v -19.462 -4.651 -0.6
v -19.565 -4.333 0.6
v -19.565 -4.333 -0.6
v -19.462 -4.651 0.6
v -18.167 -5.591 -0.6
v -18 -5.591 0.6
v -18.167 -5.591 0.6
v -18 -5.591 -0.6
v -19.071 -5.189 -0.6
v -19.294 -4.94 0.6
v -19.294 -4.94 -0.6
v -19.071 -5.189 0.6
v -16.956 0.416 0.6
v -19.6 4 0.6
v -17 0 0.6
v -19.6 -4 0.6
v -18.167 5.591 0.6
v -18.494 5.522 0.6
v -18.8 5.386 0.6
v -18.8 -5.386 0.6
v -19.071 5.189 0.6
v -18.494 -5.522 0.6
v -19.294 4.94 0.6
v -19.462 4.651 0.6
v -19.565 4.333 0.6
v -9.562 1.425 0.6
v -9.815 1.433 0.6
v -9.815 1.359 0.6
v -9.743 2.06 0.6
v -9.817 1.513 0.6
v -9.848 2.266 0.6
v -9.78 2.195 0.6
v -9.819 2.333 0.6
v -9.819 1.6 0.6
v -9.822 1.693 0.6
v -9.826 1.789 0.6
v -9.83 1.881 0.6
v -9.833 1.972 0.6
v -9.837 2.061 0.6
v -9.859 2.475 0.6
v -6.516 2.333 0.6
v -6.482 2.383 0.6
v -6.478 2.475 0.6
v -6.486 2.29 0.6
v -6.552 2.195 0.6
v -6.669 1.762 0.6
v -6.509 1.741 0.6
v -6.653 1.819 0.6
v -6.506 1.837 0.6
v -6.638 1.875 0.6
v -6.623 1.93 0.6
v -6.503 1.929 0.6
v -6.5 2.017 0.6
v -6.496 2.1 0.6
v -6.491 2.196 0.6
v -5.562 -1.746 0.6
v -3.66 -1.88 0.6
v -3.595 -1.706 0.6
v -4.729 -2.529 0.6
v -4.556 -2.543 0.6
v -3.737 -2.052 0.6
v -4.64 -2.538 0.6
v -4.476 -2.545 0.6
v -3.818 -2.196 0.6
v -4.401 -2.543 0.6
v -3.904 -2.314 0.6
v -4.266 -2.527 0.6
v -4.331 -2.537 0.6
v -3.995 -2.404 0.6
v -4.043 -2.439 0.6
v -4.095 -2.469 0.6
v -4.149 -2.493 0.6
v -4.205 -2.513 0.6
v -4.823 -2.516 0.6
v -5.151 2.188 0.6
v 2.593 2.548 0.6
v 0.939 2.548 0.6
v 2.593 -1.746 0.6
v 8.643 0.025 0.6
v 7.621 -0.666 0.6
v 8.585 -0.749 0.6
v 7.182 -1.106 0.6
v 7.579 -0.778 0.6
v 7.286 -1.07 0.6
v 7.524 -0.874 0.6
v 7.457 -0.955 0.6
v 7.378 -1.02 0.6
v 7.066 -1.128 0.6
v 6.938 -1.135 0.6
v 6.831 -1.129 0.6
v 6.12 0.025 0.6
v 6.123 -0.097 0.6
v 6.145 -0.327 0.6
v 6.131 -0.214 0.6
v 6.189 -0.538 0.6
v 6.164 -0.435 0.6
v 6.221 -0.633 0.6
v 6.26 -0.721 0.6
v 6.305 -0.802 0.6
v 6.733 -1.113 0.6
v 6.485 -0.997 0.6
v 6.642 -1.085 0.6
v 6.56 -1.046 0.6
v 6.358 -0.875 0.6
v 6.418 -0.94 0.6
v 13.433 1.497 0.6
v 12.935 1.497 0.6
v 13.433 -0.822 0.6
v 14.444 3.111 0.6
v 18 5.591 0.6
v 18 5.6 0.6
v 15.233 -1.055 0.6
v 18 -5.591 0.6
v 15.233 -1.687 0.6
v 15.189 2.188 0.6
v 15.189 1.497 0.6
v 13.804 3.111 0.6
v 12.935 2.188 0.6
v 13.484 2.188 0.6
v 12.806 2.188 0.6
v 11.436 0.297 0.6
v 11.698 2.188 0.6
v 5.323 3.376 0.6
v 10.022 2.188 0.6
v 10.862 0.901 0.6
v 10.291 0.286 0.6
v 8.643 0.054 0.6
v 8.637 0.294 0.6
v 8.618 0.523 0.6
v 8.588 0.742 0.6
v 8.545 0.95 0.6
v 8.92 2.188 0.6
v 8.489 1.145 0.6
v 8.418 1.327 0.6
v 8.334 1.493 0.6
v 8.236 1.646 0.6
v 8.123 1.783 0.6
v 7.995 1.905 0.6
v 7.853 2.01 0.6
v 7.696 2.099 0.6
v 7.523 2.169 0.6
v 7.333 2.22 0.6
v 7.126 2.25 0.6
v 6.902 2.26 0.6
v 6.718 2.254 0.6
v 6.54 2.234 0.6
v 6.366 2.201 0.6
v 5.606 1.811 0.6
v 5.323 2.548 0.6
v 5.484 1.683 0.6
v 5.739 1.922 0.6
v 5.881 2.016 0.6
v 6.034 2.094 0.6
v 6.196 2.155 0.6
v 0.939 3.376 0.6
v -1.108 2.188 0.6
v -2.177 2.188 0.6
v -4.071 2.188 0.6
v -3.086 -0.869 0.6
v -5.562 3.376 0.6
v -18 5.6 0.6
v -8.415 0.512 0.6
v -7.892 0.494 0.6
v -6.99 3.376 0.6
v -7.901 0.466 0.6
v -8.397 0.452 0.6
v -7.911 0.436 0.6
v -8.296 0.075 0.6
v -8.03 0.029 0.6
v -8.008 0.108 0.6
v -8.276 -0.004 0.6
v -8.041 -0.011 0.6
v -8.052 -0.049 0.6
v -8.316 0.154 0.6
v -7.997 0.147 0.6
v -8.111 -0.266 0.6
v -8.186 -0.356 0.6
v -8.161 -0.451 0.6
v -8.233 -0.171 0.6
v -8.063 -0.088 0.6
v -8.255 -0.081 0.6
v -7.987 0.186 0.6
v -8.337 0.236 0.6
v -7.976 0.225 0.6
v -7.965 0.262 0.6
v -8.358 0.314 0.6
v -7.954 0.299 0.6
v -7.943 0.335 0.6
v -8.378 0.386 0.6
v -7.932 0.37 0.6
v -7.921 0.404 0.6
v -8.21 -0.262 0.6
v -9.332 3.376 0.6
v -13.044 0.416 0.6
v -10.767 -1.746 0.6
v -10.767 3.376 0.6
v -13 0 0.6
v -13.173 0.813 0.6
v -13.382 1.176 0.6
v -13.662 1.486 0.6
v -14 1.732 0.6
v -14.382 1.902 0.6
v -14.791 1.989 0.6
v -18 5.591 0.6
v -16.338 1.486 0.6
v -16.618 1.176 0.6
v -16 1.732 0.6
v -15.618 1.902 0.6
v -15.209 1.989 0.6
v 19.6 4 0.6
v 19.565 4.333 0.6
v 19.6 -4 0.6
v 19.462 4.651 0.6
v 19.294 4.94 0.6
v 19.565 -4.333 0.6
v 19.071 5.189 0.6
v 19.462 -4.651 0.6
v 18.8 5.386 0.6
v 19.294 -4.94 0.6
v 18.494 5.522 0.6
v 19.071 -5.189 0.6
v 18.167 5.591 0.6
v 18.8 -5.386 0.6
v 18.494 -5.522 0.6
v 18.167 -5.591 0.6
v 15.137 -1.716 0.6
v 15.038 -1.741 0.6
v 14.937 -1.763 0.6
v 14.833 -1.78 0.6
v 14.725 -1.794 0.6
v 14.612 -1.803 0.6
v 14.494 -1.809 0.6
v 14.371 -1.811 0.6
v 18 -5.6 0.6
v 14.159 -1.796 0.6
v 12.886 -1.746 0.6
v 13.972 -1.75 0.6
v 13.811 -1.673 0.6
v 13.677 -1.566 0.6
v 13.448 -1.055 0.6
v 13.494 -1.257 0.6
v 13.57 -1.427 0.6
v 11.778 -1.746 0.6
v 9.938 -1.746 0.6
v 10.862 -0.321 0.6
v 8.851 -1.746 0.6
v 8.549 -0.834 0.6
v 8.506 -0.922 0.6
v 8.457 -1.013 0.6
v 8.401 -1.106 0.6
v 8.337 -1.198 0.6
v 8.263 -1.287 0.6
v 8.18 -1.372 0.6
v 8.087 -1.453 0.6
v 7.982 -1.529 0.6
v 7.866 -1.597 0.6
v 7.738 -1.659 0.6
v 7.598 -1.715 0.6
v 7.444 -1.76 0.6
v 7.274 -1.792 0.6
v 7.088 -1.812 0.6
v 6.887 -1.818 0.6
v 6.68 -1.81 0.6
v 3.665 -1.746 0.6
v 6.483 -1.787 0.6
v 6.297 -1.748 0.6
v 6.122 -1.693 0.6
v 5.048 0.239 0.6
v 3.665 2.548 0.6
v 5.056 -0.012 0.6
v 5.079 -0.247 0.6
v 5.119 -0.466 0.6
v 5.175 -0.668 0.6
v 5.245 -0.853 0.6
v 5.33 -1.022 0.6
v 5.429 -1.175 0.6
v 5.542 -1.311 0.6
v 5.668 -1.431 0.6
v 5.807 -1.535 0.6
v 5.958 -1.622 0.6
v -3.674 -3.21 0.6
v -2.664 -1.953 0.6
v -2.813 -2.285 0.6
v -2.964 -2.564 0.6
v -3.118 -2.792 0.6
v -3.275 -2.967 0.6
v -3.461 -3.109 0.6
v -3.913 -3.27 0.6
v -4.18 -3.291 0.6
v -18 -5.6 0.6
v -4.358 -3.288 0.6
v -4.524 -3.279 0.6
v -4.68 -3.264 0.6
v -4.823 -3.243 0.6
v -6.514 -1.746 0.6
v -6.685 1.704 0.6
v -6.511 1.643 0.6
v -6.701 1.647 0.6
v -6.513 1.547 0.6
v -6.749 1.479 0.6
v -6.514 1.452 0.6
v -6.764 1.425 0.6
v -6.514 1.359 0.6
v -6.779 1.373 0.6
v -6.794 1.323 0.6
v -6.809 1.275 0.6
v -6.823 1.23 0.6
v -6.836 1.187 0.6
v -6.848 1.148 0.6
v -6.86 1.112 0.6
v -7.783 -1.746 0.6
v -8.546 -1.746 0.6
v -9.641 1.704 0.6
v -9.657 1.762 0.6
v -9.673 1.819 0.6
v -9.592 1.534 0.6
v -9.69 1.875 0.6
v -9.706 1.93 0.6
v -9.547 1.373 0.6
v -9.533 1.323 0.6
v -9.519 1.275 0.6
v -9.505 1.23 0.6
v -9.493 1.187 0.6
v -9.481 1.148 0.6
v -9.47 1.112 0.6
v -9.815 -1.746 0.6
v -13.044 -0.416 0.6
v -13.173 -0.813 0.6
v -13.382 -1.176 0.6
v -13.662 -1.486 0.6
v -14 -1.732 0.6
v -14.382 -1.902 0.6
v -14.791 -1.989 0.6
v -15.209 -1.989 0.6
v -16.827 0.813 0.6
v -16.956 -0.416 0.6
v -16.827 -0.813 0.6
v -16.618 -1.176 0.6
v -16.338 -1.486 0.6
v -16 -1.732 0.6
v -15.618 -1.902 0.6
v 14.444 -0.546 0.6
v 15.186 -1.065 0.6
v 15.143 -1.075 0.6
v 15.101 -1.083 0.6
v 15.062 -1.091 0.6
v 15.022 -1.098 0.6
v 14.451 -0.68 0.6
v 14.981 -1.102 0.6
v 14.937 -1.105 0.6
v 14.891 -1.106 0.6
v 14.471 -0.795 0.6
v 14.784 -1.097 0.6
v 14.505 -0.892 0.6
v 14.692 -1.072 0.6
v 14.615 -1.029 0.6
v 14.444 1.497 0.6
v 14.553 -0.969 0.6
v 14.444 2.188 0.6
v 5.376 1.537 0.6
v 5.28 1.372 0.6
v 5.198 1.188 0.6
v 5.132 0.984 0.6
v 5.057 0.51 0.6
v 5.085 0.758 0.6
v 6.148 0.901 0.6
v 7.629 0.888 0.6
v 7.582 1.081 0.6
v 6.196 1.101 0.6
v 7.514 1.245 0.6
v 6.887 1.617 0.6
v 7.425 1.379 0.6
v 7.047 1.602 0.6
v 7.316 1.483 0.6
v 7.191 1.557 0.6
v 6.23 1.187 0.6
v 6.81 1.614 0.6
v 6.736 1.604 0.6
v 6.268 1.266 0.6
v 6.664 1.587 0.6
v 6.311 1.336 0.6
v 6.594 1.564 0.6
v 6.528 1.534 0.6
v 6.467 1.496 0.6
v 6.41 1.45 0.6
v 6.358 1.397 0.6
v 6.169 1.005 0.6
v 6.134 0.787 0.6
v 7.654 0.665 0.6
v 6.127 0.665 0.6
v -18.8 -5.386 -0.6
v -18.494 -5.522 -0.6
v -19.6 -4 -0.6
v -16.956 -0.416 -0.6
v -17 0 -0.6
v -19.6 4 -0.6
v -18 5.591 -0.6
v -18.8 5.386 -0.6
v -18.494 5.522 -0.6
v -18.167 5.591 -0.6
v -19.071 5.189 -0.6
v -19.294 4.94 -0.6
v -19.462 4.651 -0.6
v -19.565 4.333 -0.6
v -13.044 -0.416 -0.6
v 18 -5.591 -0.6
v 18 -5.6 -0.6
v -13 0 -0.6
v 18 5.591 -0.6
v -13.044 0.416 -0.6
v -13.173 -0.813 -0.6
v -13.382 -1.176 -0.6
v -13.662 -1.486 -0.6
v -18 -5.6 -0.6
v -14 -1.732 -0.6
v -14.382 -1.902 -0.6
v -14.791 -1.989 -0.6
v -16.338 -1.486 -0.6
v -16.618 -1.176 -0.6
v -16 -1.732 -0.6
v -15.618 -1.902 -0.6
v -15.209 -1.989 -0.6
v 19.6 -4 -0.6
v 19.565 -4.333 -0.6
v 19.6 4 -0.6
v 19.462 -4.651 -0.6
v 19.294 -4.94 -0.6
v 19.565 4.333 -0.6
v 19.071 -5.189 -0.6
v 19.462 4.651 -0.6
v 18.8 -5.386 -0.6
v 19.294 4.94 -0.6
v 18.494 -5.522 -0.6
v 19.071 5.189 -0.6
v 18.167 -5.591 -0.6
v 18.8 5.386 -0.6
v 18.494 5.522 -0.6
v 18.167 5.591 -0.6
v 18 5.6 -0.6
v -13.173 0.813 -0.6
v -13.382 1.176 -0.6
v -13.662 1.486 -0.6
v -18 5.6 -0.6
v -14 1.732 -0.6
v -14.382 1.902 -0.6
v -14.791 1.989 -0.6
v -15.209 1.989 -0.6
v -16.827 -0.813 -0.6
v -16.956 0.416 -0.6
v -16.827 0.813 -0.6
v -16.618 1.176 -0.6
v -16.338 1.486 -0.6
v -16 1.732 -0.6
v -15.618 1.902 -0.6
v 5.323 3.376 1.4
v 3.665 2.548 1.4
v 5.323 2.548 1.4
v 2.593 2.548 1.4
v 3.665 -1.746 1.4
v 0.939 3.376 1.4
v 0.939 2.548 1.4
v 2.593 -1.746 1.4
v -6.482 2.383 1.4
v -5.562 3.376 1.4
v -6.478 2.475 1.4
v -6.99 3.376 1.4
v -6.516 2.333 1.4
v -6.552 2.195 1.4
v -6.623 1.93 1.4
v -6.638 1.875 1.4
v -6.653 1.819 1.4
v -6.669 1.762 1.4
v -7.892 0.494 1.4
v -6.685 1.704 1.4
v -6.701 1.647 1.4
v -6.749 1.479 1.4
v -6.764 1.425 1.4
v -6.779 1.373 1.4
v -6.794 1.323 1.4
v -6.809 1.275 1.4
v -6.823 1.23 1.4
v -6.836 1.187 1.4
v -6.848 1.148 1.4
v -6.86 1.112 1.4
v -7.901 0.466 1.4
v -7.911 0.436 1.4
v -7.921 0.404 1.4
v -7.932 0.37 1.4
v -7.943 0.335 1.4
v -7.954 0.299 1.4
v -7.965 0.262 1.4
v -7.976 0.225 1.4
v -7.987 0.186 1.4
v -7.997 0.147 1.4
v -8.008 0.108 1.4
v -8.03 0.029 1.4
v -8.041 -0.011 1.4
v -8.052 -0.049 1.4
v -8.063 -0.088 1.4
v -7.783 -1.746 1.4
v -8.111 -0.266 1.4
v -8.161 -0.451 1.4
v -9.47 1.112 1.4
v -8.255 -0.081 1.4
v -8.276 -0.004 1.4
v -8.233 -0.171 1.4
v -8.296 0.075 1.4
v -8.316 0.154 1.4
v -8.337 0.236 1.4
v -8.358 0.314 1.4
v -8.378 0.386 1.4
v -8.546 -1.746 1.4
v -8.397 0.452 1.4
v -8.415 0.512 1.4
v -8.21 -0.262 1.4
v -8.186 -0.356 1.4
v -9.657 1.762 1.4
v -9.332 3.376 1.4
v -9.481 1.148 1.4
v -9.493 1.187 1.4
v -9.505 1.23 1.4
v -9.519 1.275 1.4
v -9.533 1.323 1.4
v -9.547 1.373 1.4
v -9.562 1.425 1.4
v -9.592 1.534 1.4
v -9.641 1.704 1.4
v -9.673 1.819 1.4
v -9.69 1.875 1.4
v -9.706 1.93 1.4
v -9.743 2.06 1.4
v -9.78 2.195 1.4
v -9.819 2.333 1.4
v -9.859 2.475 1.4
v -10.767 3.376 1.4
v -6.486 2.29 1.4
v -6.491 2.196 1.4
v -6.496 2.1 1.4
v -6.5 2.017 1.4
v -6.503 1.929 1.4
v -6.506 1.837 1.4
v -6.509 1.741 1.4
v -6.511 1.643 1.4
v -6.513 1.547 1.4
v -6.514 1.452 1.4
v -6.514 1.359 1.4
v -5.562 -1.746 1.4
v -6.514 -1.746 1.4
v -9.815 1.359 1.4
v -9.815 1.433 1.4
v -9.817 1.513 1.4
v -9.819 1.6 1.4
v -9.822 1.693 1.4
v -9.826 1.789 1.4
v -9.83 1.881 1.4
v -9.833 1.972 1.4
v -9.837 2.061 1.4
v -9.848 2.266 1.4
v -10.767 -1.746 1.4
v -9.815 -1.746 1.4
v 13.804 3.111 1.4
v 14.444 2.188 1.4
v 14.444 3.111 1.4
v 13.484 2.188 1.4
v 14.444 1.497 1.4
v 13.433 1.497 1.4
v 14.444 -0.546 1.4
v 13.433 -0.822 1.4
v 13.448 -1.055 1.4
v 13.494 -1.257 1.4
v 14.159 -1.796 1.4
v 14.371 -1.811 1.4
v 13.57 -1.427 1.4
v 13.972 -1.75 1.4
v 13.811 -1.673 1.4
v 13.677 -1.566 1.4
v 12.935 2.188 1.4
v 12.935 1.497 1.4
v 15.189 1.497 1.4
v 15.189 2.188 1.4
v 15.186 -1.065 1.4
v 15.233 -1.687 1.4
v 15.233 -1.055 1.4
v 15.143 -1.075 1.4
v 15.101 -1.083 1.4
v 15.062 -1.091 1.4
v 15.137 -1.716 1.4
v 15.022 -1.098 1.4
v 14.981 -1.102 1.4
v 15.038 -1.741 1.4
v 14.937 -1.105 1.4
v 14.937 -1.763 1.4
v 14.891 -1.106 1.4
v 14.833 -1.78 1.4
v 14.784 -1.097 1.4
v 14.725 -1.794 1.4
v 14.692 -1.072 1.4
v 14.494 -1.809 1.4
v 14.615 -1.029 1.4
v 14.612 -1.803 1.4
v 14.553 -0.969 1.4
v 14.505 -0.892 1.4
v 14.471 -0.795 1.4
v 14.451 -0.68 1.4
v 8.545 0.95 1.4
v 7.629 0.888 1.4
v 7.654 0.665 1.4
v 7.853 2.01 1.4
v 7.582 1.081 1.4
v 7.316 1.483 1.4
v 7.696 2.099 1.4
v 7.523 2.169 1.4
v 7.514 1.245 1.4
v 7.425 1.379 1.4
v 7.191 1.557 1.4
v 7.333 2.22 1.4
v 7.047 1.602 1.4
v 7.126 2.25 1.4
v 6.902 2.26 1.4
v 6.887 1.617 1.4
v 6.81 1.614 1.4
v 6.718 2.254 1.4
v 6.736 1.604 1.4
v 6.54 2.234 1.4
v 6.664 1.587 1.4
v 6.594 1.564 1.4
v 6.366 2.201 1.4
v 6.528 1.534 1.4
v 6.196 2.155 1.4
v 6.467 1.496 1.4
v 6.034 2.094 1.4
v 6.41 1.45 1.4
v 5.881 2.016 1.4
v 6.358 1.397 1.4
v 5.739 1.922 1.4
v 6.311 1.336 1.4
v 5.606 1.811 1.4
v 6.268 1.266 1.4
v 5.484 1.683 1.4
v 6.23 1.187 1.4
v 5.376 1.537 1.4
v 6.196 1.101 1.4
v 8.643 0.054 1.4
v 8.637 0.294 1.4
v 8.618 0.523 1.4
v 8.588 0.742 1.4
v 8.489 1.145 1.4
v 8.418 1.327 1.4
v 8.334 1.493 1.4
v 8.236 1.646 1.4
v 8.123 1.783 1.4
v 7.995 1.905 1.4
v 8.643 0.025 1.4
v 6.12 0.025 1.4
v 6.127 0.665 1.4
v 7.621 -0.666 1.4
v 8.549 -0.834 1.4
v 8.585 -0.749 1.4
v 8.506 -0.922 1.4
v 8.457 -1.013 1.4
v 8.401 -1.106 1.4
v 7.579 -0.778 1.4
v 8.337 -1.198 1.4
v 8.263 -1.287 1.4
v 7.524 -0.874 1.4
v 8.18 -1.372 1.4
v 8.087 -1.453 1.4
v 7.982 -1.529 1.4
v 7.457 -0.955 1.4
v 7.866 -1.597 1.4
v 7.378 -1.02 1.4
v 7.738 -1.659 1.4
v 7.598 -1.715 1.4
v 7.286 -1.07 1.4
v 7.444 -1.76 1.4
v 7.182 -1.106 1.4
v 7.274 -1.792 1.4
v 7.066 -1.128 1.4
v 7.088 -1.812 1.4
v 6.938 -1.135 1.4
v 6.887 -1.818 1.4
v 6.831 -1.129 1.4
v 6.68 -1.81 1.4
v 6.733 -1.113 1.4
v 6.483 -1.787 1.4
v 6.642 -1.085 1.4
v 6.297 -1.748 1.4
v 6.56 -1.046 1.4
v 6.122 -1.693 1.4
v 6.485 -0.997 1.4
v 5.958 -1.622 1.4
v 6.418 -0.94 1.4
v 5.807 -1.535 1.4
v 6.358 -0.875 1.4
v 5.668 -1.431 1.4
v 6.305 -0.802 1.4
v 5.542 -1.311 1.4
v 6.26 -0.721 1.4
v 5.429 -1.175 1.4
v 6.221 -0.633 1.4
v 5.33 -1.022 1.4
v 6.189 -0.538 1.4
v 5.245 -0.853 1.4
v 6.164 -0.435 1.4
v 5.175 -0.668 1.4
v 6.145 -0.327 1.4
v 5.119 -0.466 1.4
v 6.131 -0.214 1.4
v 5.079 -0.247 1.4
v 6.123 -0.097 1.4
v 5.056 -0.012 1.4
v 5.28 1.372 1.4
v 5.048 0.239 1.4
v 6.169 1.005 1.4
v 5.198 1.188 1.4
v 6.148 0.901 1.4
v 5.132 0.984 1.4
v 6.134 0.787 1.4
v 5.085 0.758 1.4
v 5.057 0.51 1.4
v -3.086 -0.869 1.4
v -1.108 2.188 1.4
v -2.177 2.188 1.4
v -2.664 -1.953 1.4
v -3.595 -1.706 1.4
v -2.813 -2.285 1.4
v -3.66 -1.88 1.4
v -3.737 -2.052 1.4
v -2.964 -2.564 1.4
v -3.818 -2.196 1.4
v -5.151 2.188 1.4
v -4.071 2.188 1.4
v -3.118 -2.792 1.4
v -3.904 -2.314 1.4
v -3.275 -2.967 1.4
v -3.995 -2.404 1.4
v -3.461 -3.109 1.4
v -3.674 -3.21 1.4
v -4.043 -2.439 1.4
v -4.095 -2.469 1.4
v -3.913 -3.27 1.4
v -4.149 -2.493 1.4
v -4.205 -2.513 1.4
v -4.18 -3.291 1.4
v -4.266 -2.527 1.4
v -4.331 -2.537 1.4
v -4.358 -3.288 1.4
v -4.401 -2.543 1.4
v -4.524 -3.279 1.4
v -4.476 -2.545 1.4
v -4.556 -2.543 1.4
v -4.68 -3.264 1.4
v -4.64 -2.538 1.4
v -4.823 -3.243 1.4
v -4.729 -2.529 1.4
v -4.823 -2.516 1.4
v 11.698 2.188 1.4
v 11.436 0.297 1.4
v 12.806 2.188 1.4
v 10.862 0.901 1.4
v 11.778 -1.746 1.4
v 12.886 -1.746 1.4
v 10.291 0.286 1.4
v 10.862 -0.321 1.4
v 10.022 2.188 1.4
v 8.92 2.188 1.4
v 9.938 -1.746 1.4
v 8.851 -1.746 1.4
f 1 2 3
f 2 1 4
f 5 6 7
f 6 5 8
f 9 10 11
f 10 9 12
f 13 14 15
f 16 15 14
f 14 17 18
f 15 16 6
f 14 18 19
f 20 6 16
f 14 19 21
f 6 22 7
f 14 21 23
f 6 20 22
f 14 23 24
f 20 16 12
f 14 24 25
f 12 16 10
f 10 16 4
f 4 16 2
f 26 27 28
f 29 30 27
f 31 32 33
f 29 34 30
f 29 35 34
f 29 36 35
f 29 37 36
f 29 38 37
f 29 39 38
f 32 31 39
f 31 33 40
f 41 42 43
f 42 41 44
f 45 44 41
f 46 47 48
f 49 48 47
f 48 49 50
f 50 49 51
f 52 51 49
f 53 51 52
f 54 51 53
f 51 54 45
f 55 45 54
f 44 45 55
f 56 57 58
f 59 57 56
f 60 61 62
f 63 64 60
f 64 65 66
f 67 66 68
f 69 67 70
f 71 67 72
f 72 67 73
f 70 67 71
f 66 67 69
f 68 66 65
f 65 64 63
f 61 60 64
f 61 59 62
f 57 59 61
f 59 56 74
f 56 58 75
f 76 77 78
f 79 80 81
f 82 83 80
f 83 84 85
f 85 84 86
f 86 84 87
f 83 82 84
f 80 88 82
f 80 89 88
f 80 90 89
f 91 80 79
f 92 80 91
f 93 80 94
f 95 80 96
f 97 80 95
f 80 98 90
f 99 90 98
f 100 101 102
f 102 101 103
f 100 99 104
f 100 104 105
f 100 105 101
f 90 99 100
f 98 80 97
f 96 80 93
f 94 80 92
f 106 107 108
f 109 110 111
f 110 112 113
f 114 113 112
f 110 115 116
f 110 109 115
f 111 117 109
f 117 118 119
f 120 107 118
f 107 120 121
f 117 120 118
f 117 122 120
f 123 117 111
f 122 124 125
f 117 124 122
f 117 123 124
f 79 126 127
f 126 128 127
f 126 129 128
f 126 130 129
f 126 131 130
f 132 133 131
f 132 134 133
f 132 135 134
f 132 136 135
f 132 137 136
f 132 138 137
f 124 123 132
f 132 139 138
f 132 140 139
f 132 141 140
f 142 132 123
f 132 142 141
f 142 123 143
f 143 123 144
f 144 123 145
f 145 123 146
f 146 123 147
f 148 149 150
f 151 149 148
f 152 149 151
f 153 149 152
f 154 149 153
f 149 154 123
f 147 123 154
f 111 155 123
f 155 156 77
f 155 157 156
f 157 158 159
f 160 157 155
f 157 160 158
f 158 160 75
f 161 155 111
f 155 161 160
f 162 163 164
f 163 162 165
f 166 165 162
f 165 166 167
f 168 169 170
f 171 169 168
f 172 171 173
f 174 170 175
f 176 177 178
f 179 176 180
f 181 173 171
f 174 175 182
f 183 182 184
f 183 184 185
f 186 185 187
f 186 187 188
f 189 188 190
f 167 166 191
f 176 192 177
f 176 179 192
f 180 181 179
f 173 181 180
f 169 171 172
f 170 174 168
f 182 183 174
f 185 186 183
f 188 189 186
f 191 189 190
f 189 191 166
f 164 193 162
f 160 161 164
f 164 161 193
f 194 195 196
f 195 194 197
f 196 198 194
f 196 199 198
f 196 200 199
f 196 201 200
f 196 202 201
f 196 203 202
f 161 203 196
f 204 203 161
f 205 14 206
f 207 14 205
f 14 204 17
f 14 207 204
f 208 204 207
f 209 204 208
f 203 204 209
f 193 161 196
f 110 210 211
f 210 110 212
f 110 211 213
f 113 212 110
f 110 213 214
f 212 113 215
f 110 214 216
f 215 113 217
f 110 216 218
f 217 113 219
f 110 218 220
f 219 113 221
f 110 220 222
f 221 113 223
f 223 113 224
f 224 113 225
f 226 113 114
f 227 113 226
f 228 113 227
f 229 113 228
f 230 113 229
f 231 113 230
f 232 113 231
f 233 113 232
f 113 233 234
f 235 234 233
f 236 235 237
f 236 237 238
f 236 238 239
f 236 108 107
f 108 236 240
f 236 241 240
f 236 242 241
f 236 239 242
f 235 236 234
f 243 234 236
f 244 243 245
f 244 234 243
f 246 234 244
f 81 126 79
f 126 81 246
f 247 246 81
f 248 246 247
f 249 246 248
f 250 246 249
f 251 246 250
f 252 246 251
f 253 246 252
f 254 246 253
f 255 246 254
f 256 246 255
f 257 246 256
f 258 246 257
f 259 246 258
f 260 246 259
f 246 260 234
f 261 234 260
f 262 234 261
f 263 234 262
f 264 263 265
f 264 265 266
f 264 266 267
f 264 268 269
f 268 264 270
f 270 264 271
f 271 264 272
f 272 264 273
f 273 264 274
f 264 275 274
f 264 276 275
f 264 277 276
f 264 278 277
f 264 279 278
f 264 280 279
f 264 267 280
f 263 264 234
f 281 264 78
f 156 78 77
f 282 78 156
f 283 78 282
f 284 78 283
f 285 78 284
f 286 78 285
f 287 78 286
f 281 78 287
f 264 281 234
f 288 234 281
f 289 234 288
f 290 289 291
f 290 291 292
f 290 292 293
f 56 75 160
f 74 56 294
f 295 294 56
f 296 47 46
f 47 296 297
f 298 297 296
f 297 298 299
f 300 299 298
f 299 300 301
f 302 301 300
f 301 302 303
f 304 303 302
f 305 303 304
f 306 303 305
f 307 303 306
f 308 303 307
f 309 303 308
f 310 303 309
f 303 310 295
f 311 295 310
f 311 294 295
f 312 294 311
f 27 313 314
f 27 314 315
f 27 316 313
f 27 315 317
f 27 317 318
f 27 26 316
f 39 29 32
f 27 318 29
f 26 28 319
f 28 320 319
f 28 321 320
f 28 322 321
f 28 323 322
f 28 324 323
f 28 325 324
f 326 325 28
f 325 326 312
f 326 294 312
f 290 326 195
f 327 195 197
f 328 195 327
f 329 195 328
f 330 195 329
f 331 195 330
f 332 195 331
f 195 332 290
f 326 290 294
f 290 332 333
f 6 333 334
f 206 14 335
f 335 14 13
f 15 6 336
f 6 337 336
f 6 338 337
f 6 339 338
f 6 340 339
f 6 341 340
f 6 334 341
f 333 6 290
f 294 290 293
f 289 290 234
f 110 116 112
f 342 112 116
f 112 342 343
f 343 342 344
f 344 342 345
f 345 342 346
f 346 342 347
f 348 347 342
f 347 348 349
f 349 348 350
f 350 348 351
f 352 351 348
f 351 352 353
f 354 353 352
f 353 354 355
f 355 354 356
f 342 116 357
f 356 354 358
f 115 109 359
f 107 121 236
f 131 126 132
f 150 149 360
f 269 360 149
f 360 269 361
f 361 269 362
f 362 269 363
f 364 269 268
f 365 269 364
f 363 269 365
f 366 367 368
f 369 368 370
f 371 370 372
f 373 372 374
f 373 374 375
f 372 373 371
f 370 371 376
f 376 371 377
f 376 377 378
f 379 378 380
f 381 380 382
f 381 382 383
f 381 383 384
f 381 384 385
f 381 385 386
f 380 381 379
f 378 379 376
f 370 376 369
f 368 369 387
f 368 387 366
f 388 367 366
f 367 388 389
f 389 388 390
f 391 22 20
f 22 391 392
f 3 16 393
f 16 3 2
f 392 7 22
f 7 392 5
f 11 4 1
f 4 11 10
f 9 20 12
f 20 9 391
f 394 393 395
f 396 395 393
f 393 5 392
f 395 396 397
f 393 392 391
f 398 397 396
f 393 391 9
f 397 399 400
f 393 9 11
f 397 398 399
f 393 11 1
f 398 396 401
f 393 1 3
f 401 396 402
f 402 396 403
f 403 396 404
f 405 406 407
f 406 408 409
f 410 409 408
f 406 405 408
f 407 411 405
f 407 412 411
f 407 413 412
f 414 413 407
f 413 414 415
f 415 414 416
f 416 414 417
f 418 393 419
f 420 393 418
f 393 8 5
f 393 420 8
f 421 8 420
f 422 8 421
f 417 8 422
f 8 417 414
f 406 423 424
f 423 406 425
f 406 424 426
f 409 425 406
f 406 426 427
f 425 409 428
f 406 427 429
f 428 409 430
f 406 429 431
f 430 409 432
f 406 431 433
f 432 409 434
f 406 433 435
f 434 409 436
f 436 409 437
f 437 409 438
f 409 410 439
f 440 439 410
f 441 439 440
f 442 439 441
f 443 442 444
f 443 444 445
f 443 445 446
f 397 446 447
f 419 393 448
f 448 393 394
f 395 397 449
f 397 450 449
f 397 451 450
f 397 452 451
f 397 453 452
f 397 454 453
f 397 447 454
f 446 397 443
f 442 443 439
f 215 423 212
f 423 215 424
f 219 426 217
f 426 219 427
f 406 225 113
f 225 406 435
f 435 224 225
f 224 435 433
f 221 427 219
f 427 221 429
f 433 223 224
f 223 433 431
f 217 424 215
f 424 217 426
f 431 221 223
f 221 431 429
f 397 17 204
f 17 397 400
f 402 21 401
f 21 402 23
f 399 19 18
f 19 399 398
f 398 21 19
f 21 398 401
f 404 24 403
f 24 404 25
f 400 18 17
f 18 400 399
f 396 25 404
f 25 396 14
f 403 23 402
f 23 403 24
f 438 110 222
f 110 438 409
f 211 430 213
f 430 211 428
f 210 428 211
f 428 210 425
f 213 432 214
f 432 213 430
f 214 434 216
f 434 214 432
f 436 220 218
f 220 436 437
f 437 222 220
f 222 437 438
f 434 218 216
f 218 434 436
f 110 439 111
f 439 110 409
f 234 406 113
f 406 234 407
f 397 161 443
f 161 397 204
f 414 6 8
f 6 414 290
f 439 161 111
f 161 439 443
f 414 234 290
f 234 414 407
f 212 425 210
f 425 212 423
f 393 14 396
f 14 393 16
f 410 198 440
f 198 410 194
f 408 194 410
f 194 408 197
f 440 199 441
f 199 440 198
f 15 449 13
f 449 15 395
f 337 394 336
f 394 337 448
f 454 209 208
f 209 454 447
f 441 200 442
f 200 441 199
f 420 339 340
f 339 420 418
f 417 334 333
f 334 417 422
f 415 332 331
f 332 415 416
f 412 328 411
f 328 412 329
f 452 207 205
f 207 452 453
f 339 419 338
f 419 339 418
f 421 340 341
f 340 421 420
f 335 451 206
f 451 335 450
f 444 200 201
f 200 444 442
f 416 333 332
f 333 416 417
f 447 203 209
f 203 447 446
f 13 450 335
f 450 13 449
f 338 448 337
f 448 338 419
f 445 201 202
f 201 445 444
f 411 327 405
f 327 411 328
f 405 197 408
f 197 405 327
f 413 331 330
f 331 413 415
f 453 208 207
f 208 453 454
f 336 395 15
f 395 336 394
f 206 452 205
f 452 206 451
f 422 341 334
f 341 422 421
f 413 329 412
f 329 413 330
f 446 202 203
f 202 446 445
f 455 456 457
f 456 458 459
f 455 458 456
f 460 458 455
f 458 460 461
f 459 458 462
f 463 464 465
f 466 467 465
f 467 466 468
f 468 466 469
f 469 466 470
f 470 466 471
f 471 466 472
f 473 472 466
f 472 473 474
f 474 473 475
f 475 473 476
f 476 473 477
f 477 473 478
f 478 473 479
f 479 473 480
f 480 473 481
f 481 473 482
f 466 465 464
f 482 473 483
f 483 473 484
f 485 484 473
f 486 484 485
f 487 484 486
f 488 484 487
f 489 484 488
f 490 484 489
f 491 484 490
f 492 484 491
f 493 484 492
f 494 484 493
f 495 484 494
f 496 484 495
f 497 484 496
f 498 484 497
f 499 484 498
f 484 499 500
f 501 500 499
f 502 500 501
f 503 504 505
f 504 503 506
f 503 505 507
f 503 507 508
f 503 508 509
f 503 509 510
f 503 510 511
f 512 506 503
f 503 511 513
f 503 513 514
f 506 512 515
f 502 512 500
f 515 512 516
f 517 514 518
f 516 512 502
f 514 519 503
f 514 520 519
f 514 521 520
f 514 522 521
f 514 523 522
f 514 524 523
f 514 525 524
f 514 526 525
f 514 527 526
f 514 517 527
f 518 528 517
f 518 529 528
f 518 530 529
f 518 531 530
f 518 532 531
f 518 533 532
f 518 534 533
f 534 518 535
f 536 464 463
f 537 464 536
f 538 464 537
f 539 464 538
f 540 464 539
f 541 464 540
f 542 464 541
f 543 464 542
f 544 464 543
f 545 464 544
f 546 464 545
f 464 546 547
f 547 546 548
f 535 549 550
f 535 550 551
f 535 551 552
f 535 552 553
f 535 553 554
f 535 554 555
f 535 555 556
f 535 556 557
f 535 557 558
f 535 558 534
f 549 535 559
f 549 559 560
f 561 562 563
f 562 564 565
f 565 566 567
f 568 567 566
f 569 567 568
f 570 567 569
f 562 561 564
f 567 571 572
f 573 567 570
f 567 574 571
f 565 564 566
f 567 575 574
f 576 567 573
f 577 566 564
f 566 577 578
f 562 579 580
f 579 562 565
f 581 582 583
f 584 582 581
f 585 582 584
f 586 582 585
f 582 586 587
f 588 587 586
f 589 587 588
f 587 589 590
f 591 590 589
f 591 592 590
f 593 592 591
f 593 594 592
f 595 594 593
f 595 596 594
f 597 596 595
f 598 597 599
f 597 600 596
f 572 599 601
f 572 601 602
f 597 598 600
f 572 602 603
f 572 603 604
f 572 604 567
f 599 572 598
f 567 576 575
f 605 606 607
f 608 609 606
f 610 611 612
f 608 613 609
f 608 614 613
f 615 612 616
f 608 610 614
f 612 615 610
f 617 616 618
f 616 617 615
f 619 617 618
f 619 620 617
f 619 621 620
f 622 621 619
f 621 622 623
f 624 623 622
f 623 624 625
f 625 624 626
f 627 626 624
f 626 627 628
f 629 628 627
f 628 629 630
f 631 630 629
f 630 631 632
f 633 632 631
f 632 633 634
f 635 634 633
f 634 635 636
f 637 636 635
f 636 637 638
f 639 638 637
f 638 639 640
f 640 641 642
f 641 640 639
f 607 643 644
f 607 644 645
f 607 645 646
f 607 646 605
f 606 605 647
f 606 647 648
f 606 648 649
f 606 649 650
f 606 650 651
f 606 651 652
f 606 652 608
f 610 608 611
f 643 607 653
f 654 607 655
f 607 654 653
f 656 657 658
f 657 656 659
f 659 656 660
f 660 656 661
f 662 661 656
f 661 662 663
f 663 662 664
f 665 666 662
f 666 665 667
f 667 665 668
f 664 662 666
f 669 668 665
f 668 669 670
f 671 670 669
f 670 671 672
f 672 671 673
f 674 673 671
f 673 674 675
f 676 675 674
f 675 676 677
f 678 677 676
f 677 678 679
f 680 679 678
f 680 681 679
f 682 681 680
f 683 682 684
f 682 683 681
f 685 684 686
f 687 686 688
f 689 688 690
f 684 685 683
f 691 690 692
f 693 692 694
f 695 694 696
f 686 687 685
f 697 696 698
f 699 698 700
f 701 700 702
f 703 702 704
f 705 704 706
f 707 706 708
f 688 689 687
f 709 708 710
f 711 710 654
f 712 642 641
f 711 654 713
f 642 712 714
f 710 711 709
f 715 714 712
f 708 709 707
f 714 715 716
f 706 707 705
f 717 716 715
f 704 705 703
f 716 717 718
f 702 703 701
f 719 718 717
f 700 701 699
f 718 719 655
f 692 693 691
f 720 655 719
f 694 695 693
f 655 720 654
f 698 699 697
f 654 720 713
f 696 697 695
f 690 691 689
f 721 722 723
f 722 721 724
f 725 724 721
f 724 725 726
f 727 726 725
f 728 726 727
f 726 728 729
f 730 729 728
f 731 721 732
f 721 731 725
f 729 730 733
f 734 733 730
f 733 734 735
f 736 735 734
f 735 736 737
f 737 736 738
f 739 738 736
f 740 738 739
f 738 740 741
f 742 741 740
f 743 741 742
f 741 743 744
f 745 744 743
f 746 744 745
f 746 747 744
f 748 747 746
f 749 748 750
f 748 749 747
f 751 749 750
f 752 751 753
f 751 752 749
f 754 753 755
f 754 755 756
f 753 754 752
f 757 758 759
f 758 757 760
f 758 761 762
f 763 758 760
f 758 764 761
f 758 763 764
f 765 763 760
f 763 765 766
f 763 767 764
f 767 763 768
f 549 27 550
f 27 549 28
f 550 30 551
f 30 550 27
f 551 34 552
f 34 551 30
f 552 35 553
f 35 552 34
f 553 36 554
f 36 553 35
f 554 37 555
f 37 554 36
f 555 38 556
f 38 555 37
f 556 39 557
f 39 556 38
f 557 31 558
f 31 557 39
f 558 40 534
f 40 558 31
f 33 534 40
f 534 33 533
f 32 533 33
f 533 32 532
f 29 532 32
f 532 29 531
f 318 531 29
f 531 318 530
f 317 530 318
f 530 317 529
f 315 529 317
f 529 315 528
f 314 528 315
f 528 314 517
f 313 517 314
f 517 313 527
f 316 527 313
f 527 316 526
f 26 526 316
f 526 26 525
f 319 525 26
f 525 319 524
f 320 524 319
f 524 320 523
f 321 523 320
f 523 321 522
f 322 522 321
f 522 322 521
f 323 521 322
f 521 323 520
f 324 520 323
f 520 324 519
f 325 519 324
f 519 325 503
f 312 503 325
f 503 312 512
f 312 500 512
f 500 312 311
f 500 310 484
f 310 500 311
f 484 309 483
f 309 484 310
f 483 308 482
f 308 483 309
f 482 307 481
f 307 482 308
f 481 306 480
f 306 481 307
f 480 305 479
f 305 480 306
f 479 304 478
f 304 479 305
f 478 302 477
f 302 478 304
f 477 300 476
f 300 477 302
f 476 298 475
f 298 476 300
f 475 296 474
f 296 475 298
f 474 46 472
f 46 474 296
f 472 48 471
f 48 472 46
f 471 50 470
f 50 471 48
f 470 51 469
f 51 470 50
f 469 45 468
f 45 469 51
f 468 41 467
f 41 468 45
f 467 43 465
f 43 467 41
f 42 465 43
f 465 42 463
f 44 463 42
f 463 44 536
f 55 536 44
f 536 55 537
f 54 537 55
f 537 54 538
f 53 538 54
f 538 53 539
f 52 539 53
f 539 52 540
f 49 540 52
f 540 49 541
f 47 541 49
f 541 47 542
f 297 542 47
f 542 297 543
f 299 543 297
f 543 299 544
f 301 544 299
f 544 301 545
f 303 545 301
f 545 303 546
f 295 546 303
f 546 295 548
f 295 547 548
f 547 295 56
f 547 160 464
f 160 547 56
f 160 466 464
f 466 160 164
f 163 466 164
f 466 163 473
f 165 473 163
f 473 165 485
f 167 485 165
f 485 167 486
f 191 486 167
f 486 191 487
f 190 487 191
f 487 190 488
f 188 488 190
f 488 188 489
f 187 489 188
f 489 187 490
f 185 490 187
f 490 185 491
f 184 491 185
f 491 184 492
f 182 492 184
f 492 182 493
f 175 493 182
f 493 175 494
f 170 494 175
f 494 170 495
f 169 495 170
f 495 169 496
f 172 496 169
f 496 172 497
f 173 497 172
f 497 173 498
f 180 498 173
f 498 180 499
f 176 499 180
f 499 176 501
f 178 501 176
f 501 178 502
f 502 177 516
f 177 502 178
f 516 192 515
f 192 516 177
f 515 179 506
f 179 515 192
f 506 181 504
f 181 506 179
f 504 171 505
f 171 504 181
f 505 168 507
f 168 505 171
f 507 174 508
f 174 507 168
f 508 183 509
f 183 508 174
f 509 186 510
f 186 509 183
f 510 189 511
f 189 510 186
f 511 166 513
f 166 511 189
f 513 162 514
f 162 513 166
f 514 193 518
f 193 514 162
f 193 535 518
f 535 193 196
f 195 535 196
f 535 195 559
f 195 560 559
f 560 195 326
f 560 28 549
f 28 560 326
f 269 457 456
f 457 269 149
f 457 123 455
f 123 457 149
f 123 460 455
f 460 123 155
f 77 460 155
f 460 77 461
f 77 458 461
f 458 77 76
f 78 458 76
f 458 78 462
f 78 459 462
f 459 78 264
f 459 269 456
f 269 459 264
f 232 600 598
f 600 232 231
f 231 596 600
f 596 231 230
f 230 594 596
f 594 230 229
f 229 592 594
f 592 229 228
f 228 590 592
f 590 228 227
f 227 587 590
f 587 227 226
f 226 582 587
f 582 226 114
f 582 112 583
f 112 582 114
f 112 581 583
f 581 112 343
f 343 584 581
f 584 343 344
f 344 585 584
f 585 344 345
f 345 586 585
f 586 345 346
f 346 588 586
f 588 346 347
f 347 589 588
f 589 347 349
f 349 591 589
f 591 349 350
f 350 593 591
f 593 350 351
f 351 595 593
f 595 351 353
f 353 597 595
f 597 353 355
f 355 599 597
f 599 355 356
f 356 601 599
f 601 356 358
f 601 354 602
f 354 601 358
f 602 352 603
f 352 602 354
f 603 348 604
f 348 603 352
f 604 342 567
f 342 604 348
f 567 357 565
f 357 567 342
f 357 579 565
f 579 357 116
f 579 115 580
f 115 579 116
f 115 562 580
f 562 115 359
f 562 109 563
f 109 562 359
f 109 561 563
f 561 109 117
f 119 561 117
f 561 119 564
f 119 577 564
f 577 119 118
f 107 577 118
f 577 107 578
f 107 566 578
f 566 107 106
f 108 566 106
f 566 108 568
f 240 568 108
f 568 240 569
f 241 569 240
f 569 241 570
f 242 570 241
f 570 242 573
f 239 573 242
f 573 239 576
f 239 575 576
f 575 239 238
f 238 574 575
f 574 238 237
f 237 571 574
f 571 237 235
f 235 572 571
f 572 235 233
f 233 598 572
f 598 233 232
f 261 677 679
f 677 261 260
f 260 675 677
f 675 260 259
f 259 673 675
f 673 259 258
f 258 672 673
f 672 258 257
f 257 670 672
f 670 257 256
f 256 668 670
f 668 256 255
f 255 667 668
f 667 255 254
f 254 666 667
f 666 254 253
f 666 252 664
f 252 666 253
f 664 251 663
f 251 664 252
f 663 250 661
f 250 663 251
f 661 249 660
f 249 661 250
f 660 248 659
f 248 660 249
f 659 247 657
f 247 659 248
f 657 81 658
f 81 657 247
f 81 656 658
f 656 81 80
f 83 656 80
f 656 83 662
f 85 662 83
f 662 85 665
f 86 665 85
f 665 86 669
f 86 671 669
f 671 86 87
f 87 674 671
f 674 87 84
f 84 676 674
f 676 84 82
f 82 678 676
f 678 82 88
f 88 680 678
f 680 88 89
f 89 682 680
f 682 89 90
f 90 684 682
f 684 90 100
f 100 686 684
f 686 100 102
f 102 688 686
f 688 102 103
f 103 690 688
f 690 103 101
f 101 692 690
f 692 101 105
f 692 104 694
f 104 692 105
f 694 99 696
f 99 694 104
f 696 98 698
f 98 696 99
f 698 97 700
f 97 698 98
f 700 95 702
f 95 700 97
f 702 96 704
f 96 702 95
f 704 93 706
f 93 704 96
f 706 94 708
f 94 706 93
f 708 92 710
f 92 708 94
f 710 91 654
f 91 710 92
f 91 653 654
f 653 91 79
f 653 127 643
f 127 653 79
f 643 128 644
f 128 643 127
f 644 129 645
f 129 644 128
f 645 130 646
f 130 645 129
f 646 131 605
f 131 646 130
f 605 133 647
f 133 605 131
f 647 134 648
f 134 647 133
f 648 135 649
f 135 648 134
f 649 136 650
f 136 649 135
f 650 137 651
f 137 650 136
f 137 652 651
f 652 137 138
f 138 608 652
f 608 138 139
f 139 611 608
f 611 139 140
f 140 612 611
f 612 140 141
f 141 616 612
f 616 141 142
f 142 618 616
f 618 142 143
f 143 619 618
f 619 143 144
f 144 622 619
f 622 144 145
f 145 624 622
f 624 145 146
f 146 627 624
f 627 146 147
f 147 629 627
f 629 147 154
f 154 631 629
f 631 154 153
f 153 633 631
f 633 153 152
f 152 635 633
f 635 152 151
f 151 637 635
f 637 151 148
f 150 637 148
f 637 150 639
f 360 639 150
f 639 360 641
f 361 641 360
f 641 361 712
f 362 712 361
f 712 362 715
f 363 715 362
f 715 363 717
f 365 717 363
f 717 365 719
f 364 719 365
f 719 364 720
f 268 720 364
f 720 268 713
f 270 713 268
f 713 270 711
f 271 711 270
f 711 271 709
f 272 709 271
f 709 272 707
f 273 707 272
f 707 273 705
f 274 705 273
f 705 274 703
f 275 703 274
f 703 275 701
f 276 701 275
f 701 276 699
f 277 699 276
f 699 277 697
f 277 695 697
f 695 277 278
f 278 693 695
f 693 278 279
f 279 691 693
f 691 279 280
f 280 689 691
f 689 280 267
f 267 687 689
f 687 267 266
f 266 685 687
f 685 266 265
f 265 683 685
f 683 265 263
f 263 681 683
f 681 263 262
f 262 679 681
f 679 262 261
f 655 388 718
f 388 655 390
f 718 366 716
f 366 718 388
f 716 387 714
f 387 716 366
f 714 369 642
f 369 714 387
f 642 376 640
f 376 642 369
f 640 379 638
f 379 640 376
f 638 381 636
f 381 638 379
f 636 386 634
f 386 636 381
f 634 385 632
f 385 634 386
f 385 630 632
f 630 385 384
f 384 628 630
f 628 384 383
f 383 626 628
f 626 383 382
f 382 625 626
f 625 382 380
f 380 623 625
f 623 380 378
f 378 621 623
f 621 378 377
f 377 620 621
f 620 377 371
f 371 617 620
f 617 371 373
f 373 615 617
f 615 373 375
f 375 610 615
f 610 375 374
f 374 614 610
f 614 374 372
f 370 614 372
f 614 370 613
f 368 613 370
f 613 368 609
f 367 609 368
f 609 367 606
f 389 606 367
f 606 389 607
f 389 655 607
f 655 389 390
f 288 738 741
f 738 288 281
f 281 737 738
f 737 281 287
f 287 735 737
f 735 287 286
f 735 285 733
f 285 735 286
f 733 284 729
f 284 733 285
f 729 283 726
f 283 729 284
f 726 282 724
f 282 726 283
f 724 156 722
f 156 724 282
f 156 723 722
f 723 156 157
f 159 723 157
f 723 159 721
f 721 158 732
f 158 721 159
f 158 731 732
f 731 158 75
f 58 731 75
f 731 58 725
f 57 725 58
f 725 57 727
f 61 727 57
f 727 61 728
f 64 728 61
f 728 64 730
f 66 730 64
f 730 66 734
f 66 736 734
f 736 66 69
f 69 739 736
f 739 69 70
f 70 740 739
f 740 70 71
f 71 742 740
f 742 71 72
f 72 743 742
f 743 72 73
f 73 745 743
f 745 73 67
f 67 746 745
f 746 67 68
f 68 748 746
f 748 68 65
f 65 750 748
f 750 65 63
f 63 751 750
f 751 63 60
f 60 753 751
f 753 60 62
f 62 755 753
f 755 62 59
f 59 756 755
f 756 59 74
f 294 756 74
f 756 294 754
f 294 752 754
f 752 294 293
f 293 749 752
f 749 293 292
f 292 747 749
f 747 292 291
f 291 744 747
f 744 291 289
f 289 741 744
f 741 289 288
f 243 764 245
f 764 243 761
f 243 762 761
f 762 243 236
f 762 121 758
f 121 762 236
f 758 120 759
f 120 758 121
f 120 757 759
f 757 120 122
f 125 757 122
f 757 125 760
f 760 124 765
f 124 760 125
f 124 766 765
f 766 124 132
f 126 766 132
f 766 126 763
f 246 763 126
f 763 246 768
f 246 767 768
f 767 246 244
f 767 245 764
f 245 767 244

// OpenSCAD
// ORIGINAL LICENSE
// (c) 2019 Pavel Suchmann <pavel@suchmann.cz>
// Licensed under the terms of "Creative Commons - Public Domain Dedication"
//
// Note the source code would be more succint with minkowski()
// but its use is not recommended by Customizer's best practises.


// THIS SCRIPT IS A REMIX OF THE CUSTOMIZABLE KEYCHAIN SCRIPT FOUND ON https://www.thingiverse.com/thing:3496798


// your text
label = "My Text";

// size of the font
size = 4; // [3:8]

// font name
font = "Liberation Sans:style=Bold"; // [ "Liberation Sans:style=Bold", "Open Sans:style=Bold", "Dejavu Serif:style=Bold", "Liberation Serif:style=Bold", "Luxi Serif:style=Bold" ]

/* [Hidden] */

$fn=30;

width = size * 2.0;
hole = 2;
length = (len(label)+2) * size;
border = size * 0.4;
height = 1.2;
emboss = 0.2;

// Les lettres ressortent.
style = "outward";
// Les lettres rentrent.
// style = "inward" ;

//echo(length);
//echo(width);

difference() {
    union() {
        translate([-length/2, -width/2, 0])
            cylinder(r=border, h=height, center=true);
        translate([length/2, -width/2, 0])
            cylinder(r=border, h=height, center=true);
        translate([-length/2, width/2, 0])
            cylinder(r=border, h=height, center=true);
        translate([length/2, width/2, 0])
            cylinder(r=border, h=height, center=true);
        cube([length, width+border*2, height], center=true);
        cube([length+border*2, width, height], center=true);
    }

    union() {
        if (style == "inward") {
            translate([hole, 0, emboss])
                linear_extrude(height) 
                    resize([(length - 5*hole) * 1.0, 0], auto=true)
                        text(label, size, halign="center", valign="center", font=font);       
        }
        // Rond
        translate([-length/2+1.5*hole, 0, -0.1])
            cylinder(r=hole, h=height*2, center=true);
    }
}

if (style == "outward") {
    translate([hole, 0, emboss])
        linear_extrude(height) 
            resize([(length - 5*hole) * 1.0, 0], auto=true)
                text(label, size, halign="center", valign="center", font=font);
}
